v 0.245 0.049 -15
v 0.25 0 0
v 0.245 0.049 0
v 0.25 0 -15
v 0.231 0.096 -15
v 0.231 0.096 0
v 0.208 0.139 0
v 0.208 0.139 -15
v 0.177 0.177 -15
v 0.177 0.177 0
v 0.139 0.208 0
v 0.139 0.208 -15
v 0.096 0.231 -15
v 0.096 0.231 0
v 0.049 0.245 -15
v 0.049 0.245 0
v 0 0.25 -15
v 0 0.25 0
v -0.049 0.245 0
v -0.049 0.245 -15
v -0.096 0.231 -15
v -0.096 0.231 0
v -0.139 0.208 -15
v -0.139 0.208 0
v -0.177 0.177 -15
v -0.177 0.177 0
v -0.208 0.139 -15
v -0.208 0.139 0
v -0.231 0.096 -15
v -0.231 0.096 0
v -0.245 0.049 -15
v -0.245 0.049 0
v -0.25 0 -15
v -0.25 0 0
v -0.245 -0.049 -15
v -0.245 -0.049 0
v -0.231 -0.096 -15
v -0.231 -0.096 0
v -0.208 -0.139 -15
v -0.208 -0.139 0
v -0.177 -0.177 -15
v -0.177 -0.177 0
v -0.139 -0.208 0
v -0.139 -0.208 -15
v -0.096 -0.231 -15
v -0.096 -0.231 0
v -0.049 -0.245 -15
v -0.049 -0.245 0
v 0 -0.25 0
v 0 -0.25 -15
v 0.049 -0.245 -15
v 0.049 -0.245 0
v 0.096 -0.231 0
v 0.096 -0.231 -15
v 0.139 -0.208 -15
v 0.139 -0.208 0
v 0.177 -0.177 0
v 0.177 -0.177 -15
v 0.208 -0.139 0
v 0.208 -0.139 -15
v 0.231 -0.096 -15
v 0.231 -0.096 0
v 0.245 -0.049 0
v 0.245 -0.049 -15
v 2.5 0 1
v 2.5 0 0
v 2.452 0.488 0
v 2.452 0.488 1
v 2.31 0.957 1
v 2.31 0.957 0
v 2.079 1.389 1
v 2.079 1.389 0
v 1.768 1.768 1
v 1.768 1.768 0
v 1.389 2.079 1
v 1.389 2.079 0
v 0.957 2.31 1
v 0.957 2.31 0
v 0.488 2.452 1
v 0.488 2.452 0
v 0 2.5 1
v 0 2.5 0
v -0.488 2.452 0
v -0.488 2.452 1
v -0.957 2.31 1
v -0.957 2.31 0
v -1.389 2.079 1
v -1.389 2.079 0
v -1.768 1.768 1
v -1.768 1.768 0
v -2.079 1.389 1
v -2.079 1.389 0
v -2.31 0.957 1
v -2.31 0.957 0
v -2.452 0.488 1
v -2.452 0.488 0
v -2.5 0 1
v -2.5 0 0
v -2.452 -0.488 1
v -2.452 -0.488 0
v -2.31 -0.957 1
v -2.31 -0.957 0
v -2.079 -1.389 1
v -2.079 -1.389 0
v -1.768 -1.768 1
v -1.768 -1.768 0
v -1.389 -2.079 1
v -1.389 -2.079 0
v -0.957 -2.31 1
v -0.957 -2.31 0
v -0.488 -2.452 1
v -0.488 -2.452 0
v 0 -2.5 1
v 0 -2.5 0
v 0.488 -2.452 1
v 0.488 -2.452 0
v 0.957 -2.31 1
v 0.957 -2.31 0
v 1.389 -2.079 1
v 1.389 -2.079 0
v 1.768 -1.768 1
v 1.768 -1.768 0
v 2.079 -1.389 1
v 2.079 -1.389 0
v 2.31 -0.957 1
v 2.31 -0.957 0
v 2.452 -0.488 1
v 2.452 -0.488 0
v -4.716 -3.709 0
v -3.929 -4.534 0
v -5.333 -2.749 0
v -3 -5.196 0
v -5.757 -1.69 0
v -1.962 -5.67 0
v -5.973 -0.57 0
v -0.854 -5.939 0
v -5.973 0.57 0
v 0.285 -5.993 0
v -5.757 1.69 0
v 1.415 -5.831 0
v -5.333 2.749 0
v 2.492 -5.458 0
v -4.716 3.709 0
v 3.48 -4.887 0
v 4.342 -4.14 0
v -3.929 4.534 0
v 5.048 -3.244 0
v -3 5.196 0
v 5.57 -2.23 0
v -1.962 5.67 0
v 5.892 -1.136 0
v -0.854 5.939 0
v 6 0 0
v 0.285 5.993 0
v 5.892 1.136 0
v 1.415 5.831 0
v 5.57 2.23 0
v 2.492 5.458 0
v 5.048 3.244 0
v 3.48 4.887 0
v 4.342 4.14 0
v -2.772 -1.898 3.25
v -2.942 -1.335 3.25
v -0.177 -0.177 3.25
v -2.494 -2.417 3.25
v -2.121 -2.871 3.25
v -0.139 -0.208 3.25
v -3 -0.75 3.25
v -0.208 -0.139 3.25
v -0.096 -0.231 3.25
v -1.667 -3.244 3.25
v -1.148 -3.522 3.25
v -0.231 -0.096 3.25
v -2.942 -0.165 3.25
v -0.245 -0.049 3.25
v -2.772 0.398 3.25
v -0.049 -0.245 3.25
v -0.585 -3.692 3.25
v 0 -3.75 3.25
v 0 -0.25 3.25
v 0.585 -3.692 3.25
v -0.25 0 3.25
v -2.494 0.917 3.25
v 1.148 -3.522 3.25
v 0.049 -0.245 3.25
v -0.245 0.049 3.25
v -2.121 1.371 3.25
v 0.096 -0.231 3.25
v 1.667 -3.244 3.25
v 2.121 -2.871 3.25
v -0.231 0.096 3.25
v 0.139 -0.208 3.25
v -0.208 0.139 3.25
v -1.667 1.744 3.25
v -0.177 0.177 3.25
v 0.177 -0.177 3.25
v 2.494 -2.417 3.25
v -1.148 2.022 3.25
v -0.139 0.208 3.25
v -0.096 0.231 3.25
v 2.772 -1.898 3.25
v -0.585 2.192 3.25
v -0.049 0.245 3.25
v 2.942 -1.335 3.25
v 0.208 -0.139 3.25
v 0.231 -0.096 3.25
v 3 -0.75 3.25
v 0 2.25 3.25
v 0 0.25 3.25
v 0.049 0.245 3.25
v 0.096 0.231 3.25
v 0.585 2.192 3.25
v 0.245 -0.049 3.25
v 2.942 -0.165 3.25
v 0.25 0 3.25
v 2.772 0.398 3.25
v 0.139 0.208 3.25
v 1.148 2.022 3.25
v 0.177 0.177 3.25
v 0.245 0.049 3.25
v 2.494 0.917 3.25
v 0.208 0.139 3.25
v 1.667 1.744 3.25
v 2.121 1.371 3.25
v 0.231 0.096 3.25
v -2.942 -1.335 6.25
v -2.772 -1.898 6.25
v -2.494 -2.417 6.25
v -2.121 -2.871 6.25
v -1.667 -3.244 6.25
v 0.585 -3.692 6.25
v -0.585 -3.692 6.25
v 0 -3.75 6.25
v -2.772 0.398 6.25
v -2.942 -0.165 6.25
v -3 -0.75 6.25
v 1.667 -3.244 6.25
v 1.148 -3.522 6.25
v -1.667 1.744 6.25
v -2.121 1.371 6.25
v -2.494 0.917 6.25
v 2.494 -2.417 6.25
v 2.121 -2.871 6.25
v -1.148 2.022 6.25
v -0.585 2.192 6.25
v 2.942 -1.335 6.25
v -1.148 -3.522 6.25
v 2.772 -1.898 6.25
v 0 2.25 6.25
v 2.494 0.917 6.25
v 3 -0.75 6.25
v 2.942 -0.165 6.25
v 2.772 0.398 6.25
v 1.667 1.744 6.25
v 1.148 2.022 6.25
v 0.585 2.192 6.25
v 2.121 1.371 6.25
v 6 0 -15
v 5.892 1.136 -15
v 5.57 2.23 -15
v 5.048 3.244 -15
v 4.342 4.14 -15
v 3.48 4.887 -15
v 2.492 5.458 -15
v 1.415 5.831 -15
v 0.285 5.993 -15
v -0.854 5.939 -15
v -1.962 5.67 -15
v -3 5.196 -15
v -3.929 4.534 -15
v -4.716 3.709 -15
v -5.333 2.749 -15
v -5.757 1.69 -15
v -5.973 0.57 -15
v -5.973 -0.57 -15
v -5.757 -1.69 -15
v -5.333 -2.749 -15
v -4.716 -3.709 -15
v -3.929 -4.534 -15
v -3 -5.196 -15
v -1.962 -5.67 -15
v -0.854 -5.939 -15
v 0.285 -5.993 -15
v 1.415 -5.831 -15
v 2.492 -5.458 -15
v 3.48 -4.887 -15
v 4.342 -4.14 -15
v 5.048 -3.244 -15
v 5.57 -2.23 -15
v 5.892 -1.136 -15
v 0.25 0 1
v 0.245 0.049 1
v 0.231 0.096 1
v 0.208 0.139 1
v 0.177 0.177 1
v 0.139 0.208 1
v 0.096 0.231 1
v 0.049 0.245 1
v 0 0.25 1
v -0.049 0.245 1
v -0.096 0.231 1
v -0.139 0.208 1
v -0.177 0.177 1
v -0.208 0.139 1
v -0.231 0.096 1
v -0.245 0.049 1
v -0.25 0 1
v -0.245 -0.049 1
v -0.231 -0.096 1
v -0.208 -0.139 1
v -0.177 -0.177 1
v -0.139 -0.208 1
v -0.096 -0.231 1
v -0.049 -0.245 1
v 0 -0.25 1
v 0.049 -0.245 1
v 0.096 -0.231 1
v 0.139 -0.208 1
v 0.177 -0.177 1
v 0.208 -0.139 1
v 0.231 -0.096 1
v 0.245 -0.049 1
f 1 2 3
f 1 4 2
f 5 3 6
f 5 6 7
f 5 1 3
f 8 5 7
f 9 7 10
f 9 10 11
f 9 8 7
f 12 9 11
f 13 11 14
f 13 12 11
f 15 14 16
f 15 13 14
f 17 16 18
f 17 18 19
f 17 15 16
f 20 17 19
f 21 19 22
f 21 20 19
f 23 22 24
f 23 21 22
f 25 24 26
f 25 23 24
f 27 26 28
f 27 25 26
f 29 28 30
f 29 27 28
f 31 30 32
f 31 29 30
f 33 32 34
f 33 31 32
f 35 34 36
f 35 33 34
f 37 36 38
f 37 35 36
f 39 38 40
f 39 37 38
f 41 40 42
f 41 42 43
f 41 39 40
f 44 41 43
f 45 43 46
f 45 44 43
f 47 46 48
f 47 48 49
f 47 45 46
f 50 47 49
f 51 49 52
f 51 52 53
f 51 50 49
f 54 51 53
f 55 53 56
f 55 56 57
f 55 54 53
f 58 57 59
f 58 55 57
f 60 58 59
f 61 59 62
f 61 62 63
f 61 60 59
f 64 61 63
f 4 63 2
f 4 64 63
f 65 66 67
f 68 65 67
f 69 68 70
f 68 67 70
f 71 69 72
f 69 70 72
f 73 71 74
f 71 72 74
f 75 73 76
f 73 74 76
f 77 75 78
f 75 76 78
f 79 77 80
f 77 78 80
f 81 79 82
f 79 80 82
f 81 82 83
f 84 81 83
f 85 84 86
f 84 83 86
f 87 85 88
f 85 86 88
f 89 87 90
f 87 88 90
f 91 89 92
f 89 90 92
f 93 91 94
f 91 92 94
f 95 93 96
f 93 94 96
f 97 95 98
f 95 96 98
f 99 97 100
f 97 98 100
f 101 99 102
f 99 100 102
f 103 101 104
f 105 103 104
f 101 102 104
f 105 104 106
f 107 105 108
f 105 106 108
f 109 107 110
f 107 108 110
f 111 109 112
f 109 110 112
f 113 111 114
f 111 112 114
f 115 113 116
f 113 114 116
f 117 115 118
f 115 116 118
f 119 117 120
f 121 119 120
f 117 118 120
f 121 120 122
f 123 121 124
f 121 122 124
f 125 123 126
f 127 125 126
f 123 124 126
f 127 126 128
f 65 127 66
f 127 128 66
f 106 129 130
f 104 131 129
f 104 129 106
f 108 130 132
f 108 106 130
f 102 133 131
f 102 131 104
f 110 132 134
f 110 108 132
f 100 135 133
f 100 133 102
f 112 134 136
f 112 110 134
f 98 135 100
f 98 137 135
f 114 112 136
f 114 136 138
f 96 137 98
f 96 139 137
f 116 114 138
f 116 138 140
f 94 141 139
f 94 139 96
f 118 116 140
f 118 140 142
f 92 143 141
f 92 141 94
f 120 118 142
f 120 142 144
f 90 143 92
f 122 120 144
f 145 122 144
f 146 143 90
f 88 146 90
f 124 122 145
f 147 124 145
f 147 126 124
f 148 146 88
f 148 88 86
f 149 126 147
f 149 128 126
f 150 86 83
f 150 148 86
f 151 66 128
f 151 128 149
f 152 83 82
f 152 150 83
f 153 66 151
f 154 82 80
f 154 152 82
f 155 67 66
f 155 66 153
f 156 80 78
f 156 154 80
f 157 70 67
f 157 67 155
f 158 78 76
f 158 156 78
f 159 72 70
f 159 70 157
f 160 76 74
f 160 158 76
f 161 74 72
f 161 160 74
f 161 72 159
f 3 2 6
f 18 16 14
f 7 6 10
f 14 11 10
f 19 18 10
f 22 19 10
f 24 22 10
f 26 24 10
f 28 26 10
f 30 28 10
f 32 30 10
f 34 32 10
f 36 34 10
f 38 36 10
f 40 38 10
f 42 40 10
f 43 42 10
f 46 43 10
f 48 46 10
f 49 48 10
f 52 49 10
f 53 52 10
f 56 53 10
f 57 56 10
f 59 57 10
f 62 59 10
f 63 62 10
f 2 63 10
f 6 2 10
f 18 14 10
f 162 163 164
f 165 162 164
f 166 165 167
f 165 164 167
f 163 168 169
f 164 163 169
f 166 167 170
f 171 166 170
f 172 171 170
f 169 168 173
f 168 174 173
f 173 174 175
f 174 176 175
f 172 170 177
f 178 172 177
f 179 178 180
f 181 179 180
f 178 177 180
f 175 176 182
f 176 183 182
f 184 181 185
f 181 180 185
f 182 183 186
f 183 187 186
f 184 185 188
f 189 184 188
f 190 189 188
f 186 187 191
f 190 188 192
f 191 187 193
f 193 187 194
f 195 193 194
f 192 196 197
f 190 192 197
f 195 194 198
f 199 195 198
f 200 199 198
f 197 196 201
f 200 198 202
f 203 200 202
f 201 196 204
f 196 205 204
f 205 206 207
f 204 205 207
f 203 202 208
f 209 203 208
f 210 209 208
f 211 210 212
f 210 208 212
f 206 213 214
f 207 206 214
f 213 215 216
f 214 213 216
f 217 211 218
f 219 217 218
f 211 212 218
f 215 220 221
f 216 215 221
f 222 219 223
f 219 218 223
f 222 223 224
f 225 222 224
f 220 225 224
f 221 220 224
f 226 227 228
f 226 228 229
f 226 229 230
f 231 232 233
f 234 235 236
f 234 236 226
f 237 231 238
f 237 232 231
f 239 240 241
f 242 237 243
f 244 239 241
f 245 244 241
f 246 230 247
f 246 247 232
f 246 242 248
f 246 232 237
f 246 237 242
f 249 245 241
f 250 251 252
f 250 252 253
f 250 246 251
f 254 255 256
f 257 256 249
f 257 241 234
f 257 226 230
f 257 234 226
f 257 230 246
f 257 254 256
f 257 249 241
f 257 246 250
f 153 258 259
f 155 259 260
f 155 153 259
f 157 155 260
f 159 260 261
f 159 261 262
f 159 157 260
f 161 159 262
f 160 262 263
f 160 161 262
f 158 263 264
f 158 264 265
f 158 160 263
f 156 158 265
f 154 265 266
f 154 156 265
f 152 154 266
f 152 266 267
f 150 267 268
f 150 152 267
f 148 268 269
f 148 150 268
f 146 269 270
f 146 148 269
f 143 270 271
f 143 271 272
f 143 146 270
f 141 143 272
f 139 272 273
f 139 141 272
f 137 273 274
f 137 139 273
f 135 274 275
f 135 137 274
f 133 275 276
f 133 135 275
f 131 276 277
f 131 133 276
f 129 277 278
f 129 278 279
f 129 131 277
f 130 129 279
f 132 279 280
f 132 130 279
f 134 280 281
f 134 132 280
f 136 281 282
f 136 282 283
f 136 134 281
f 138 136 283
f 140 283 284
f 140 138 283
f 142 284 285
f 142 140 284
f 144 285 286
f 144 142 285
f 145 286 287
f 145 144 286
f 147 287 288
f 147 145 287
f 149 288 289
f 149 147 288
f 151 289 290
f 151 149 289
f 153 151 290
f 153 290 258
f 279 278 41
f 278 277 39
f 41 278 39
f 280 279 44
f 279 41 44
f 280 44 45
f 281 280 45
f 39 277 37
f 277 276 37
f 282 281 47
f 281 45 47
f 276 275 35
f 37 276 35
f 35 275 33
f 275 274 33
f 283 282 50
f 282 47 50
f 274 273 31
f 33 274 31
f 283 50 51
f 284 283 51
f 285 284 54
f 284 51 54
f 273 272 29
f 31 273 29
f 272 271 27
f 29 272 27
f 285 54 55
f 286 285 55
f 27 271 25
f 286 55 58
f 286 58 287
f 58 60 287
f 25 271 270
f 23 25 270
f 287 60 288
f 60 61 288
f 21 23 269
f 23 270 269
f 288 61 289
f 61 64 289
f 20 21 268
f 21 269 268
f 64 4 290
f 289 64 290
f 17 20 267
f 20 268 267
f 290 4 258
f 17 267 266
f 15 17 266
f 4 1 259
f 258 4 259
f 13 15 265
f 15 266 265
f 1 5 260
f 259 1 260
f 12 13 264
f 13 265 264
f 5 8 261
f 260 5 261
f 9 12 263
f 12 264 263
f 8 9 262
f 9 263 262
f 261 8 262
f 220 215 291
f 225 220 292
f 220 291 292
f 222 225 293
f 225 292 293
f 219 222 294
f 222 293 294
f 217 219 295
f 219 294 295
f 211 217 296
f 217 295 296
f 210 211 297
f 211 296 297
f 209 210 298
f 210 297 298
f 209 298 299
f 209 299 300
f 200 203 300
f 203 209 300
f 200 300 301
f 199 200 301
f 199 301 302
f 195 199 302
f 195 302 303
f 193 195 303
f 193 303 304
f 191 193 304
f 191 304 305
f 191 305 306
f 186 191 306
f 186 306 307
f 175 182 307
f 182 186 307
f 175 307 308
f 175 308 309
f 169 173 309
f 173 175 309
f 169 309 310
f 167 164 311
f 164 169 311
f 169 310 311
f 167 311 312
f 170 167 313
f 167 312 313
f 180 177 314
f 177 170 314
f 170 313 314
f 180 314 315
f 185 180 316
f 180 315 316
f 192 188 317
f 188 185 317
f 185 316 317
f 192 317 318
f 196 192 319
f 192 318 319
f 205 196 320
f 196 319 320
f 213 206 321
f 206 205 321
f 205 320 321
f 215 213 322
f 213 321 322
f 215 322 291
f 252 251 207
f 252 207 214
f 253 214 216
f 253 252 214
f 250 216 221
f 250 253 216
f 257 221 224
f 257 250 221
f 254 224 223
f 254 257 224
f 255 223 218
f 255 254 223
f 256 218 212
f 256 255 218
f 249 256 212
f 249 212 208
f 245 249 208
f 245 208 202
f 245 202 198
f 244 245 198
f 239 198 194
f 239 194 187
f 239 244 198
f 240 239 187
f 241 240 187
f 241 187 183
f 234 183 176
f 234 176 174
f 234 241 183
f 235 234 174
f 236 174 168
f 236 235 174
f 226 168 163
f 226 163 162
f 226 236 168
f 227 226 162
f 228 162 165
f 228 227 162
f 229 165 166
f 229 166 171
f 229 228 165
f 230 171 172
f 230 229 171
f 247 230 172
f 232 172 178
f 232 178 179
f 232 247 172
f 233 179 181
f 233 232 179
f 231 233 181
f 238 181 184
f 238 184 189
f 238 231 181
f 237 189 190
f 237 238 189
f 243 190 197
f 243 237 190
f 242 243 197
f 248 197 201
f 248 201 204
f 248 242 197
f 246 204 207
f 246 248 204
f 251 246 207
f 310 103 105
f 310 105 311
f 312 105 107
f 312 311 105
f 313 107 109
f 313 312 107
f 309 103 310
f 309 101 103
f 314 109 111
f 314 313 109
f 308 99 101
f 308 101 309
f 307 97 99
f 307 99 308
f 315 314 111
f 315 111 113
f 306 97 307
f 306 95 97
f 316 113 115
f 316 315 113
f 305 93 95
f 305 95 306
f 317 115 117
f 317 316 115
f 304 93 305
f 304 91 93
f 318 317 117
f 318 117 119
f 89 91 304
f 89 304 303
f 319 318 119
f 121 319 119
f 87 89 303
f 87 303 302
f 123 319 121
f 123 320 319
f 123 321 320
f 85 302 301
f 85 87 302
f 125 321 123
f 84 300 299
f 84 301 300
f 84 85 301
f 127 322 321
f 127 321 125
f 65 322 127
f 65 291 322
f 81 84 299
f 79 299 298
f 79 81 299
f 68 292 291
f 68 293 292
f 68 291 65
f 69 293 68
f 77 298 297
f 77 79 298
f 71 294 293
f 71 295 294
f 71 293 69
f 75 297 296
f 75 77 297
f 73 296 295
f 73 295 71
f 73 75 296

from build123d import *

# Parameters (mm, degrees)
F0_R     = 6
F0_R_2   = 2.5
F0_R_3   = 0.25
F1_DEPTH = 15
F2_DEPTH = 1
F3_DEPTH = 6.25
F4_R     = 3
F5_DEPTH = 3


with BuildPart() as f1:
    # F0 (on Top) → F1 (new body)
    with BuildSketch(Plane.XY):
        Circle(F0_R)
        Circle(F0_R_2, mode=Mode.SUBTRACT)
        Circle(F0_R_2)
        Circle(F0_R_3, mode=Mode.SUBTRACT)
    extrude(amount=-F1_DEPTH)

    # F0 (on Top) → F2 (join)
    with BuildSketch(Plane.XY):
        Circle(F0_R_2)
        Circle(F0_R_3, mode=Mode.SUBTRACT)
    extrude(amount=F2_DEPTH)

    # F0 (on Top) → F3 (join)
    with BuildSketch(Plane.XY):
        Circle(F0_R_3)
    extrude(amount=F3_DEPTH)

    # F4 (on face) → F5 (join)
    with BuildSketch(Plane.XY.offset(6.25)):
        with Locations((0, -0.75)):
            Circle(F4_R)
    extrude(amount=-F5_DEPTH)


solid = f1.part
